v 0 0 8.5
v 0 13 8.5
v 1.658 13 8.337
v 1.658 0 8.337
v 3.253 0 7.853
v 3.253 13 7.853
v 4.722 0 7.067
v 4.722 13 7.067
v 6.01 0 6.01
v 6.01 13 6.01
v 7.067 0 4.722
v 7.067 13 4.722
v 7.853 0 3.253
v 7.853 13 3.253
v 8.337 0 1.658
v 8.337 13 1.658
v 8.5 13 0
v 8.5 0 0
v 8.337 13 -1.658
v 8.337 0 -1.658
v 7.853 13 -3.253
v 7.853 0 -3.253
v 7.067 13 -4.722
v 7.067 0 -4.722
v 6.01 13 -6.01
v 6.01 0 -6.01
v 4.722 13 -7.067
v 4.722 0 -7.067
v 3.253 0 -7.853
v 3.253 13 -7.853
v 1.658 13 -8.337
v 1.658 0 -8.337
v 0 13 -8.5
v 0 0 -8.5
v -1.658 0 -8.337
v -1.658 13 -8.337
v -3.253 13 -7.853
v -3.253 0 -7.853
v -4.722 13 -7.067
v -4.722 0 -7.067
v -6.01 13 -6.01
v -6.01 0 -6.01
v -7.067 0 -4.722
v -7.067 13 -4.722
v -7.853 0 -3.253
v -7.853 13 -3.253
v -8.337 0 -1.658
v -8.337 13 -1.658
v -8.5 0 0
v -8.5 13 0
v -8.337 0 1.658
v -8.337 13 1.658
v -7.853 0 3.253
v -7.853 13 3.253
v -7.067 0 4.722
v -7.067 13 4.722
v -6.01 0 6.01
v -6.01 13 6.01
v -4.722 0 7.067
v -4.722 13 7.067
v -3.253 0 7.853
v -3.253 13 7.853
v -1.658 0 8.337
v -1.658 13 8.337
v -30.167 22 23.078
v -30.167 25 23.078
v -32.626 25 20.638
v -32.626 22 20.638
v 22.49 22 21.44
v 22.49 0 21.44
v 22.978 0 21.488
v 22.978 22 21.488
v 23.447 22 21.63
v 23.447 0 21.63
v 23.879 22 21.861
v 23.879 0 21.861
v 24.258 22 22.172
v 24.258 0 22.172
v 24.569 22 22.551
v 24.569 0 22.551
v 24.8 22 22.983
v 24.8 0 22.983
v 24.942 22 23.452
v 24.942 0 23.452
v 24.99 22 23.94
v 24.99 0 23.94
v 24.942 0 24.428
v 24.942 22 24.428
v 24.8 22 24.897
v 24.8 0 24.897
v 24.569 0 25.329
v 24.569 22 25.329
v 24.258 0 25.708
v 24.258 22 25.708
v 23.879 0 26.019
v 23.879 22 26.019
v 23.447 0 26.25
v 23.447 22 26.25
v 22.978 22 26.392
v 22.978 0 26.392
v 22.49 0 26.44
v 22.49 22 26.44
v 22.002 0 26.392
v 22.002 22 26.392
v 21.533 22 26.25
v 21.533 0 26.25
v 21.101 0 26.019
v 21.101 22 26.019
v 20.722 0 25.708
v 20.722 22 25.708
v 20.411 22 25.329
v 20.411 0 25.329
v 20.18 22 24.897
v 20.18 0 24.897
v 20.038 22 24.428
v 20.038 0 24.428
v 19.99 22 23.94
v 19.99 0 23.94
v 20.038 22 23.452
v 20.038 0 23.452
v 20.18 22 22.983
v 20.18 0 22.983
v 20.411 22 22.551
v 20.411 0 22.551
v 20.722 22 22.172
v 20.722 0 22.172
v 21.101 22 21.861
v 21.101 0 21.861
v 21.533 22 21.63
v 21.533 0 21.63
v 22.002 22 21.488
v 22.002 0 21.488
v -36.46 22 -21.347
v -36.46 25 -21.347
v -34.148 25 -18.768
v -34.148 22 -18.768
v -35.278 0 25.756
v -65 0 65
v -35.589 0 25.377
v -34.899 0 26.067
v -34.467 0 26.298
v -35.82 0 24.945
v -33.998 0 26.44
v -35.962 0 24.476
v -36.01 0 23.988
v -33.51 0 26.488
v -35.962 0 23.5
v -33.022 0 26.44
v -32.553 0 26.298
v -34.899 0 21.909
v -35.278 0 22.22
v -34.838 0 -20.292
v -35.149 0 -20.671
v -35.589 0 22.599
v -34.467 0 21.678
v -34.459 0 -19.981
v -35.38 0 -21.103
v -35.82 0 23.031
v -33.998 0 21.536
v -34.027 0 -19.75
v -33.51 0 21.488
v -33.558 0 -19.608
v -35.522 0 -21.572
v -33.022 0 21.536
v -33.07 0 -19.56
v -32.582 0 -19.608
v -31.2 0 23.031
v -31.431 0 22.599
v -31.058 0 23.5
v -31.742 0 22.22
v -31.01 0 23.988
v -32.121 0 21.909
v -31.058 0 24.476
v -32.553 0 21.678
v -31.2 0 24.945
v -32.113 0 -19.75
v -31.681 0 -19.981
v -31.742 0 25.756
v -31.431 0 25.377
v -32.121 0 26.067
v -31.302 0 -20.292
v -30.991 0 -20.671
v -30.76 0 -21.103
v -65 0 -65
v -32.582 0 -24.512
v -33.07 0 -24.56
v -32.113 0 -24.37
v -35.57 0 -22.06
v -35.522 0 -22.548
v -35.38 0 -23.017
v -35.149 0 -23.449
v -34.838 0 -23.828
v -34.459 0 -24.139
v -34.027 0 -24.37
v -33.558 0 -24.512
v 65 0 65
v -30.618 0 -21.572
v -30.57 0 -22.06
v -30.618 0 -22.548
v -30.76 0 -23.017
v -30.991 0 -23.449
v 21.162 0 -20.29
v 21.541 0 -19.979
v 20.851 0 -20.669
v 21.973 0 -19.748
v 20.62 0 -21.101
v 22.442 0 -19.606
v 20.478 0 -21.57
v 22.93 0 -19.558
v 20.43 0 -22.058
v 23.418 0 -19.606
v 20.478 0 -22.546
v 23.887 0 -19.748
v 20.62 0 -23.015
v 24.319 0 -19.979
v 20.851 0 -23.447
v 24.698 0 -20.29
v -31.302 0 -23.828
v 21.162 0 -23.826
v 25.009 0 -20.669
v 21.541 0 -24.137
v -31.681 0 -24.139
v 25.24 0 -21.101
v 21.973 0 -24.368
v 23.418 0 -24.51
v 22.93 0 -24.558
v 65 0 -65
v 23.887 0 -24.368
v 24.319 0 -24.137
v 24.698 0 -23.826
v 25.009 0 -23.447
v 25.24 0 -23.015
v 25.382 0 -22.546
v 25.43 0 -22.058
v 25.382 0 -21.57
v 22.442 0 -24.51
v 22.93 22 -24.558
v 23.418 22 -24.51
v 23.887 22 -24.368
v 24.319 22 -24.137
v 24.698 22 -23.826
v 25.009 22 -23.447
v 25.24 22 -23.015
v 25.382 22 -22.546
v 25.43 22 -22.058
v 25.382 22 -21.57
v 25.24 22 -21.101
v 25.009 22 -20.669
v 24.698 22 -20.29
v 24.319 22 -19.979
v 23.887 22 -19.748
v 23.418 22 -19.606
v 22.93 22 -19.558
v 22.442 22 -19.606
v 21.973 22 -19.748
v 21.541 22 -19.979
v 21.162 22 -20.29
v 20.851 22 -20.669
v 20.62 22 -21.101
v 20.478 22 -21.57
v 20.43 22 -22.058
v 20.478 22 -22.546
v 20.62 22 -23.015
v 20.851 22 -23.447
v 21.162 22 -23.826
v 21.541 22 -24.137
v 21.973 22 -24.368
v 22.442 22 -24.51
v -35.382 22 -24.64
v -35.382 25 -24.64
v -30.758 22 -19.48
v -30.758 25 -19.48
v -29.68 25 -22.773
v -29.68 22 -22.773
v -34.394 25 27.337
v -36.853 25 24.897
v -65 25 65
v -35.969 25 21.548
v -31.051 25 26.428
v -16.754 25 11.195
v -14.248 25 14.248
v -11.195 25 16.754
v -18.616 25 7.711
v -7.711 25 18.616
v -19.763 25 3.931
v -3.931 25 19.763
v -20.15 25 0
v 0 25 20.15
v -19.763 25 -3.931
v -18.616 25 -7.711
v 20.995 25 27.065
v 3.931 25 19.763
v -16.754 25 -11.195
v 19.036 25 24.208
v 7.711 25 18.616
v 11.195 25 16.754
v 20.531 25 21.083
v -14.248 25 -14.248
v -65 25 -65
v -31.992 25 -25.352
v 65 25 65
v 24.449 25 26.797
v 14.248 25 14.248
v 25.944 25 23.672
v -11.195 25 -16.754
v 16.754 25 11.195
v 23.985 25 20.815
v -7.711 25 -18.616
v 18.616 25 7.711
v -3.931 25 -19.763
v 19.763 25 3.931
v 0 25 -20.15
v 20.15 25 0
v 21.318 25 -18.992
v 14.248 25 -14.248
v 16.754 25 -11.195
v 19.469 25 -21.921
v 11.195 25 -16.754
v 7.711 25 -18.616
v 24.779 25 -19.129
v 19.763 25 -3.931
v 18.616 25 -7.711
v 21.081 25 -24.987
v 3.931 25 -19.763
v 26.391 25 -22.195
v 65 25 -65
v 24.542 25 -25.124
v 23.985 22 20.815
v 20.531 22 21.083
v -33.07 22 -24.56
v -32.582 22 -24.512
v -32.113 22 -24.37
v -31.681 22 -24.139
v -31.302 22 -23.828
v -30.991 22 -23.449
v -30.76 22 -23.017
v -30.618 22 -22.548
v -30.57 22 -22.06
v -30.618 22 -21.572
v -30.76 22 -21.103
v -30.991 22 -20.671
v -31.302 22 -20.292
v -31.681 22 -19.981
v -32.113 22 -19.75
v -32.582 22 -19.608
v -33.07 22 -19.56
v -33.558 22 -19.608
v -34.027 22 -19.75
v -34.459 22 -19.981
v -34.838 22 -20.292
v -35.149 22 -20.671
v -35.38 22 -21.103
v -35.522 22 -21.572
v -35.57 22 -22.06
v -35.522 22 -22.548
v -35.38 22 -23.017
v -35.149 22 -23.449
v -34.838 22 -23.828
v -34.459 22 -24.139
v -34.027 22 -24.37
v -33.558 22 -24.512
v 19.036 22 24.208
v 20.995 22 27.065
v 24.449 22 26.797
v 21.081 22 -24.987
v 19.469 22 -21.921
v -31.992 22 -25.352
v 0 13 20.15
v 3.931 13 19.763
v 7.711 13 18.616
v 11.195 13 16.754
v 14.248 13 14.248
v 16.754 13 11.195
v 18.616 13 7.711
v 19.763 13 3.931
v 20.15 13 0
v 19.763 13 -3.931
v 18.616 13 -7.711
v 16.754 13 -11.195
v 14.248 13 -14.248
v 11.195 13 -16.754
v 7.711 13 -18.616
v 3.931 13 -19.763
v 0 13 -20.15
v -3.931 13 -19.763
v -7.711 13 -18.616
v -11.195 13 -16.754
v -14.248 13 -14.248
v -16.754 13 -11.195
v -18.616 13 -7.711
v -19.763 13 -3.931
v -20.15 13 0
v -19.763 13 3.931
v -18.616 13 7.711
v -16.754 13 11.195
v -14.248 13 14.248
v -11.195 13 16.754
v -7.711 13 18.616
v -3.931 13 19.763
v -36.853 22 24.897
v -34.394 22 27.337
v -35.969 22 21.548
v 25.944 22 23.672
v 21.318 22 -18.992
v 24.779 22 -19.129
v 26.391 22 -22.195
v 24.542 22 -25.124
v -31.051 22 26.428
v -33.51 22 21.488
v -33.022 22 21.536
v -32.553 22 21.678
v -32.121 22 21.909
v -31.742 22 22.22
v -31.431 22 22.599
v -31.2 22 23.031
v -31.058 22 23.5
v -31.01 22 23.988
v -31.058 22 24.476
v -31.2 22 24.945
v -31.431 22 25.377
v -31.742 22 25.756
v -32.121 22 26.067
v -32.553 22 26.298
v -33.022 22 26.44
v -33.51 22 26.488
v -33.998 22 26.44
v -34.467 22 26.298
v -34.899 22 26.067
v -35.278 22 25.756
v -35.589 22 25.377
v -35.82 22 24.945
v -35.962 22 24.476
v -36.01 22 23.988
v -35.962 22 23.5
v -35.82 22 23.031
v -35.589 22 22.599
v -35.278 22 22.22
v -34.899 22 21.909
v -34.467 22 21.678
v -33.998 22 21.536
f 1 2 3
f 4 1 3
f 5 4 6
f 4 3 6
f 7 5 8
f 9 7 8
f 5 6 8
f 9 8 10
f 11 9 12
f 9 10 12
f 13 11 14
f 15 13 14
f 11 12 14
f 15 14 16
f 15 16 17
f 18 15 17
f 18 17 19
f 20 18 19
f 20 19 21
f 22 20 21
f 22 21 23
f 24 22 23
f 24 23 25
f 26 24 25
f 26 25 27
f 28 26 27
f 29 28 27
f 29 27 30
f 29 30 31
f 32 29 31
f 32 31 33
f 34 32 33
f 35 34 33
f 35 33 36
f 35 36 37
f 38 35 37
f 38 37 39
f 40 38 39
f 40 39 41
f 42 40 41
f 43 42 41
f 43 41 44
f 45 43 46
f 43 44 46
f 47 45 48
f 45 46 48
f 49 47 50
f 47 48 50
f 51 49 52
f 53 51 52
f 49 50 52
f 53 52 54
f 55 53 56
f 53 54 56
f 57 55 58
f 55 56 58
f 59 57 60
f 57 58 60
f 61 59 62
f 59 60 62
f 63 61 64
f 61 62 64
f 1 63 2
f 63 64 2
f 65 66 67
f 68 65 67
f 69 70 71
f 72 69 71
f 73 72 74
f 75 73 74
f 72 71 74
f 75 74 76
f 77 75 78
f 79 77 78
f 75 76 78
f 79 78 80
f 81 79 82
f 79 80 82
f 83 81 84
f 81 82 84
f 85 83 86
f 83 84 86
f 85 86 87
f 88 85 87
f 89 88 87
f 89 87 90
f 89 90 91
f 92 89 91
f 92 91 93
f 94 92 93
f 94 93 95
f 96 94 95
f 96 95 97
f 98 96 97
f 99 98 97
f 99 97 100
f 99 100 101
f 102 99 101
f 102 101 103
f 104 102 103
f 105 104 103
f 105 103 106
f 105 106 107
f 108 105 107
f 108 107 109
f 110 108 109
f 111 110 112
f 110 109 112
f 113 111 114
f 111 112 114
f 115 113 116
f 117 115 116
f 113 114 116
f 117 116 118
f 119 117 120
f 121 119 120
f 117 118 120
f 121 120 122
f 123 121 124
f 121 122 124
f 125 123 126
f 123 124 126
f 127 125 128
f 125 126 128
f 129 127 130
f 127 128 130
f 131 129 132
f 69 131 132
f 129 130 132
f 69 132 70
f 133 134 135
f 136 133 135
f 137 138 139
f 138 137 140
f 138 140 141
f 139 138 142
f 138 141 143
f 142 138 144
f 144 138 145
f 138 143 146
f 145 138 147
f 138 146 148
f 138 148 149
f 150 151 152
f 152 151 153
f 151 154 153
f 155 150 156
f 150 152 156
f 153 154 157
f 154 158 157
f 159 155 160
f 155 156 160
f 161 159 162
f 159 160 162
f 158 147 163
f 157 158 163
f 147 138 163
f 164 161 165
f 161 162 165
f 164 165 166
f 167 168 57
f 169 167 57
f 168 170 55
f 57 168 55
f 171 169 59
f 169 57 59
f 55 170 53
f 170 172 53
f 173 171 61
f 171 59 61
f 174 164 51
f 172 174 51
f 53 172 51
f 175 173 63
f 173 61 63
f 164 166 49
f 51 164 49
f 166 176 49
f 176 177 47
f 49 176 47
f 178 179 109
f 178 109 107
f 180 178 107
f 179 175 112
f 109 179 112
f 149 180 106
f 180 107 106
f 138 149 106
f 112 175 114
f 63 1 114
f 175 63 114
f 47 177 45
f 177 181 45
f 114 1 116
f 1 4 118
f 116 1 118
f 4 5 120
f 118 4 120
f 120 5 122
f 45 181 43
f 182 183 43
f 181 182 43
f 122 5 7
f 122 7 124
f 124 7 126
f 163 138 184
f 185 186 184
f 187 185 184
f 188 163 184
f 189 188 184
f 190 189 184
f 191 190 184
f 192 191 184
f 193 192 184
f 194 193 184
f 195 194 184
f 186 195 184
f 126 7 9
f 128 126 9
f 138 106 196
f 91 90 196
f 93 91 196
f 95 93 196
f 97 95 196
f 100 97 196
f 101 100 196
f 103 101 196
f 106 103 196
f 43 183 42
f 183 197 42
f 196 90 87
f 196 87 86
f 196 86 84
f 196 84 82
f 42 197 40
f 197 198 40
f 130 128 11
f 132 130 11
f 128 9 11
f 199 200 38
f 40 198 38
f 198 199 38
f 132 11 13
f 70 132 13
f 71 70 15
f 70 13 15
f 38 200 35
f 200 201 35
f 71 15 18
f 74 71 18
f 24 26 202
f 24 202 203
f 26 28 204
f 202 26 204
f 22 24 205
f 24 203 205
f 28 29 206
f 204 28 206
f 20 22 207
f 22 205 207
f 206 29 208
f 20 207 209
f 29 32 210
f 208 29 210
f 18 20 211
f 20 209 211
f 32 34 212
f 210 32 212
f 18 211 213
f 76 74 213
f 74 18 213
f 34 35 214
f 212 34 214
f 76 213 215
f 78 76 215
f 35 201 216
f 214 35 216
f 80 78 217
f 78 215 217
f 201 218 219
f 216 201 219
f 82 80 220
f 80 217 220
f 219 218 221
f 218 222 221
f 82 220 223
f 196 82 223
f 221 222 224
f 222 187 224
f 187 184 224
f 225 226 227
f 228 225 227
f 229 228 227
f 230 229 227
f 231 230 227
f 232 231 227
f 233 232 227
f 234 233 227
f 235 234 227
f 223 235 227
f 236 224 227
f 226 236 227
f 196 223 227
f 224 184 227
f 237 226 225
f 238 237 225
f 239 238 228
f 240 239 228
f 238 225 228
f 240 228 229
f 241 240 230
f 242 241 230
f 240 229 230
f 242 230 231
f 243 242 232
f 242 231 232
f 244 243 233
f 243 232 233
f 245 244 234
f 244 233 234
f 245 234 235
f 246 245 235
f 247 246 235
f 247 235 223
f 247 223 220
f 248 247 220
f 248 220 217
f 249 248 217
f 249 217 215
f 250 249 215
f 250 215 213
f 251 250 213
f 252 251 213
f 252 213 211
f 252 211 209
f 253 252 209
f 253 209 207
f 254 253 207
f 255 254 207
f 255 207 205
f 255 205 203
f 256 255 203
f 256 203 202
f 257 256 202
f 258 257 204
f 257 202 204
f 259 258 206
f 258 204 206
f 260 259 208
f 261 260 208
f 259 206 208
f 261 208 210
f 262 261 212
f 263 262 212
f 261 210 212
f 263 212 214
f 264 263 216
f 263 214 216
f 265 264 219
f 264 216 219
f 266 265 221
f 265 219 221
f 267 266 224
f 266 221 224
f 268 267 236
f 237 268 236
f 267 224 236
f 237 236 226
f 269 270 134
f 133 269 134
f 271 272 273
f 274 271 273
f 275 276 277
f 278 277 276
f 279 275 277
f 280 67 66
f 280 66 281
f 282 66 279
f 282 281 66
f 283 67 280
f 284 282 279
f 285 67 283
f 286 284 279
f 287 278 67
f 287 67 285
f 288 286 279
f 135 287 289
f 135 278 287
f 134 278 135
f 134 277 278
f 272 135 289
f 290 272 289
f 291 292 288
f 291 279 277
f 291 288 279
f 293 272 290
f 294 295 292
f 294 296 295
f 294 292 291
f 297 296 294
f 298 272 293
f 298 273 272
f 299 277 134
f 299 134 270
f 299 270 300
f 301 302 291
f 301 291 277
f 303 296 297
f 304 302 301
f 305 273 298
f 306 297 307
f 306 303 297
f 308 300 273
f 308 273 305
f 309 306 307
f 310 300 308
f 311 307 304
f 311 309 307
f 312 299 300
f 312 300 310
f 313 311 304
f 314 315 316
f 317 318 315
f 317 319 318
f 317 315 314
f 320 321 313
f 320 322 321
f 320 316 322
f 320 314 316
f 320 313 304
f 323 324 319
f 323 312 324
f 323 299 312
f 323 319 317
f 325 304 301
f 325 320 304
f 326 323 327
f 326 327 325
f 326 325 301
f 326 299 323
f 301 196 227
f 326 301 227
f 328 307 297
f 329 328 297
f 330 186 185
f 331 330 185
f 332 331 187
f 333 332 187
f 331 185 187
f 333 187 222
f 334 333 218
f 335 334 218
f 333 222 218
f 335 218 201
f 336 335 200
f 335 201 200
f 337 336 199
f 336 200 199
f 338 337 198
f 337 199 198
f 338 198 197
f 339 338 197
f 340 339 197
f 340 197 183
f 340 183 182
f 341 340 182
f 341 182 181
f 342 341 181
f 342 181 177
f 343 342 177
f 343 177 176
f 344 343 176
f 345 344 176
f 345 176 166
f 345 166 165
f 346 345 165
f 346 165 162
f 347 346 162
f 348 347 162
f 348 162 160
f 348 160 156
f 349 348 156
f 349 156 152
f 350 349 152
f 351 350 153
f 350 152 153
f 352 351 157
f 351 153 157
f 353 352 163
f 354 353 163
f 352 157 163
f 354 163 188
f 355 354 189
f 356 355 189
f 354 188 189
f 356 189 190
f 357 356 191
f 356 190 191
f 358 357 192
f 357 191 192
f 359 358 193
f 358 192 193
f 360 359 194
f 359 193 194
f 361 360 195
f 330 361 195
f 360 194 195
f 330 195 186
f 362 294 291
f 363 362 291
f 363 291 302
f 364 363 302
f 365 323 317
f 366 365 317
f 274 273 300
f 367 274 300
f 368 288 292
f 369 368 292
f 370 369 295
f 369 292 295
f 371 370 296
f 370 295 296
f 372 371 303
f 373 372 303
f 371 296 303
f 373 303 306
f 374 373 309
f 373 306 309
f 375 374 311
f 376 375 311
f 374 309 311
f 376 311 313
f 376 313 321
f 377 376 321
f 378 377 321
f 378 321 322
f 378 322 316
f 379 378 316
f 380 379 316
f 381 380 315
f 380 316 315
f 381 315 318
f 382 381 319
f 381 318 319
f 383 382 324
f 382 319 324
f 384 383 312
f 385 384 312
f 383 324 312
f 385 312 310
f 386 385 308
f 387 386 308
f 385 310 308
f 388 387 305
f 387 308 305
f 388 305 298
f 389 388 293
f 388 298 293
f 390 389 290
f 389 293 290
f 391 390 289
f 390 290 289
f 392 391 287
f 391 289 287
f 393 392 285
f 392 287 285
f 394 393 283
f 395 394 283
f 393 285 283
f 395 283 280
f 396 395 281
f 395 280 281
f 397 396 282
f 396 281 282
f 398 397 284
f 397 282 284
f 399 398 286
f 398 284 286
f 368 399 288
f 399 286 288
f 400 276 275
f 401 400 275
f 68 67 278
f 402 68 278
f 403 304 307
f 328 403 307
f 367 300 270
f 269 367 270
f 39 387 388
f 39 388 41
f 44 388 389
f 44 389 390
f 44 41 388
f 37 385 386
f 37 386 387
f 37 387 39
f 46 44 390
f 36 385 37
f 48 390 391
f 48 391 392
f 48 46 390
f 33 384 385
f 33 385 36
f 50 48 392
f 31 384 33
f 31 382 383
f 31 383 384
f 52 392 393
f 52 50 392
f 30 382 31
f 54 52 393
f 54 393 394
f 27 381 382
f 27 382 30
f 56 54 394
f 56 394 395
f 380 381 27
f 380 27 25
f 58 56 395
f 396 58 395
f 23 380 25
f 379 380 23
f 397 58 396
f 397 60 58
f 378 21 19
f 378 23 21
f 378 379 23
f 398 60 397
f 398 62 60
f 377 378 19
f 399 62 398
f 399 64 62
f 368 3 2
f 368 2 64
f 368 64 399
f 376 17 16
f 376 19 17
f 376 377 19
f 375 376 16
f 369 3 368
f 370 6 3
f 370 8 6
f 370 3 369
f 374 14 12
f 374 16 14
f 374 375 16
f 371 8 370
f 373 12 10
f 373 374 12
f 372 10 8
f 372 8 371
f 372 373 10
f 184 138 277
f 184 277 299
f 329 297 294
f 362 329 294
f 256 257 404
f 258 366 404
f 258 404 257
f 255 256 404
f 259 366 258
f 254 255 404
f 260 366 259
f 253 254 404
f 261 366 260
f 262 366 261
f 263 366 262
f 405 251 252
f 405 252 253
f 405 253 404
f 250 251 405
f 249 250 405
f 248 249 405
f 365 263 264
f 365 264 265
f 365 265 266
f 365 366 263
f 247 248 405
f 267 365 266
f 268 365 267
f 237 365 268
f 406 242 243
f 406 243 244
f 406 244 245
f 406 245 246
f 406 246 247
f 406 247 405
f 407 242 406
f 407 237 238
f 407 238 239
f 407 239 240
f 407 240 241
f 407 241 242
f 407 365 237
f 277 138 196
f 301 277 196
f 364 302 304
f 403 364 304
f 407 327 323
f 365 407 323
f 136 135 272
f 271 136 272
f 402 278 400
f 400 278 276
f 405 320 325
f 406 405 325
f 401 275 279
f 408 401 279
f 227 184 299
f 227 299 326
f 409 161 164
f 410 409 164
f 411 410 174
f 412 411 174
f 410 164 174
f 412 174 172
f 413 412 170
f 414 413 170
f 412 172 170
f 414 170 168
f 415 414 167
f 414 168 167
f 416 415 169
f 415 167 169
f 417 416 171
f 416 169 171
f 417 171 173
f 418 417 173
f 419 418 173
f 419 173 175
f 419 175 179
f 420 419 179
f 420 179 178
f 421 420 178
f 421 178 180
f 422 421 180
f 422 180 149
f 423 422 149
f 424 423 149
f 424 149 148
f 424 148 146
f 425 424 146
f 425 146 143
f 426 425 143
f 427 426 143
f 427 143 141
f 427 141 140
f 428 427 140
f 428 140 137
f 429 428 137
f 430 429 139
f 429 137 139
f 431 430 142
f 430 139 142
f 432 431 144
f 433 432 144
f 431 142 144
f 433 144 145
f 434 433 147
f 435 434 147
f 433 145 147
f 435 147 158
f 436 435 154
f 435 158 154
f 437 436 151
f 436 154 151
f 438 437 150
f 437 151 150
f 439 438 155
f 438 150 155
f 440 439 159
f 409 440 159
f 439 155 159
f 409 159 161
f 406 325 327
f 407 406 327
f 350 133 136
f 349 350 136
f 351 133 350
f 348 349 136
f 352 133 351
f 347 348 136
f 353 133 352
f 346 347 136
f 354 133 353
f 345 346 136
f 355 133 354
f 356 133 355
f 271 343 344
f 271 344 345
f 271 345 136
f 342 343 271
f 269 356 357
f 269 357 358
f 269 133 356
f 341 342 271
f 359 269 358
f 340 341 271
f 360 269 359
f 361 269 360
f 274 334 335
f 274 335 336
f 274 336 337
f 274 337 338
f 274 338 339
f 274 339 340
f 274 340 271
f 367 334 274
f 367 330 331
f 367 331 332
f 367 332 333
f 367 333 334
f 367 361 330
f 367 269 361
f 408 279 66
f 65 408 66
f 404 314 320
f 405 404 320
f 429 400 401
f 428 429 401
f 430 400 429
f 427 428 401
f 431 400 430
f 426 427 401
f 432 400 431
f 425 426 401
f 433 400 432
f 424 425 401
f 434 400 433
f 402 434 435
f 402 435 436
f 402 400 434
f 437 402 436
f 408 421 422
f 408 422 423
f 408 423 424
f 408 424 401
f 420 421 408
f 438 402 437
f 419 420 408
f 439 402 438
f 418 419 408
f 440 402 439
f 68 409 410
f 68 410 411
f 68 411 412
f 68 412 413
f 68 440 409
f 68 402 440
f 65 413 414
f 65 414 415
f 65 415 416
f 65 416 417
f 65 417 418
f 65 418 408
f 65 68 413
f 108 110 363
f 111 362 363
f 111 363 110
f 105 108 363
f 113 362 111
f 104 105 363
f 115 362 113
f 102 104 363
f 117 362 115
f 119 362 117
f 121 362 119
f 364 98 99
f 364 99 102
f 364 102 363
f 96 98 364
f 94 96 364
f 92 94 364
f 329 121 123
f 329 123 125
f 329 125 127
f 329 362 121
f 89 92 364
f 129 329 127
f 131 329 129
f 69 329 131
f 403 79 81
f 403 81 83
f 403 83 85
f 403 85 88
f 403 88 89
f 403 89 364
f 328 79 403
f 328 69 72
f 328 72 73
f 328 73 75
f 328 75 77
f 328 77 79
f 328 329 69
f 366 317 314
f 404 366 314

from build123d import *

# Parameters (mm, degrees)
SKETCH1_W           = 130
SKETCH1_H           = 130
BOSS_EXTRUDE1_DEPTH = 25
SKETCH2_R           = 20.15
CUT_EXTRUDE1_DEPTH  = 12
SKETCH3_R           = 8.5
CUT_EXTRUDE2_DEPTH  = 22
SKETCH5_R           = 2.5
CUT_EXTRUDE4_DEPTH  = 30
CUT_EXTRUDE7_DEPTH  = 3


with BuildPart() as part:
    # Sketch1 → Boss-Extrude1 (new body)
    with BuildSketch(Plane(origin=(0, 0, 0), x_dir=(1, 0, 0), z_dir=(0, 1, 0))):
        Rectangle(SKETCH1_W, SKETCH1_H)
    extrude(amount=BOSS_EXTRUDE1_DEPTH)

    # Sketch2 → Cut-Extrude1 (cut)
    with BuildSketch(Plane(origin=(0, 25, 0), x_dir=(1, 0, 0), z_dir=(0, 1, 0))):
        with Locations(Location((0, 0, 0), (0, 0, 270))):
            Circle(SKETCH2_R)
    extrude(amount=-CUT_EXTRUDE1_DEPTH, mode=Mode.SUBTRACT)

    # Sketch3 → Cut-Extrude2 (cut)
    with BuildSketch(Plane(origin=(0, 13, 0), x_dir=(1, 0, 0), z_dir=(0, 1, 0))):
        with Locations(Location((0, 0, 0), (0, 0, 270))):
            Circle(SKETCH3_R)
    extrude(amount=-CUT_EXTRUDE2_DEPTH, mode=Mode.SUBTRACT)

    # Sketch5 → Cut-Extrude4 (cut)
    with BuildSketch(Plane(origin=(0, 0, 0), x_dir=(-1, 0, 0), z_dir=(0, -1, 0))):
        with Locations(Location((-22.49, -23.94, 0), (0, 0, 90))):
            Circle(SKETCH5_R)
        with Locations(Location((33.509979516, -23.987898085, 0), (0, 0, 90))):
            Circle(SKETCH5_R)
        with Locations(Location((33.07, 22.06, 0), (0, 0, 90))):
            Circle(SKETCH5_R)
        with Locations(Location((-22.92999996, 22.057895604, 0), (0, 0, 90))):
            Circle(SKETCH5_R)
    extrude(amount=-CUT_EXTRUDE4_DEPTH, mode=Mode.SUBTRACT)

    # Sketch7 → Cut-Extrude7 (cut)
    with BuildSketch(Plane(origin=(0, 25, 0), x_dir=(1, 0, 0), z_dir=(0, 1, 0))):
        Polygon((23.984601443, -20.814913357), (20.530896299, -21.08309386), (19.036294857, -24.208180504), (20.995398557, -27.065086643), (24.449103701, -26.79690614), (25.943705143, -23.671819496), align=None)
        Polygon((-32.626257702, -20.638415176), (-35.968855897, -21.54783109), (-36.852577711, -24.897313998), (-34.39370133, -27.337380993), (-31.051103134, -26.42796508), (-30.16738132, -23.078482171), align=None)
        Polygon((-34.147910167, 18.767871559), (-30.757888221, 19.480438192), (-29.679978054, 22.772566633), (-31.992089833, 25.352128441), (-35.382111779, 24.639561808), (-36.460021946, 21.347433367), align=None)
        Polygon((24.779410064, 19.128786138), (26.391388221, 22.194977003), (24.541978117, 25.12408647), (21.080589856, 24.987005071), (19.4686117, 21.920814206), (21.318021804, 18.991704739), align=None)
    extrude(amount=-CUT_EXTRUDE7_DEPTH, mode=Mode.SUBTRACT)


solid = part.part
